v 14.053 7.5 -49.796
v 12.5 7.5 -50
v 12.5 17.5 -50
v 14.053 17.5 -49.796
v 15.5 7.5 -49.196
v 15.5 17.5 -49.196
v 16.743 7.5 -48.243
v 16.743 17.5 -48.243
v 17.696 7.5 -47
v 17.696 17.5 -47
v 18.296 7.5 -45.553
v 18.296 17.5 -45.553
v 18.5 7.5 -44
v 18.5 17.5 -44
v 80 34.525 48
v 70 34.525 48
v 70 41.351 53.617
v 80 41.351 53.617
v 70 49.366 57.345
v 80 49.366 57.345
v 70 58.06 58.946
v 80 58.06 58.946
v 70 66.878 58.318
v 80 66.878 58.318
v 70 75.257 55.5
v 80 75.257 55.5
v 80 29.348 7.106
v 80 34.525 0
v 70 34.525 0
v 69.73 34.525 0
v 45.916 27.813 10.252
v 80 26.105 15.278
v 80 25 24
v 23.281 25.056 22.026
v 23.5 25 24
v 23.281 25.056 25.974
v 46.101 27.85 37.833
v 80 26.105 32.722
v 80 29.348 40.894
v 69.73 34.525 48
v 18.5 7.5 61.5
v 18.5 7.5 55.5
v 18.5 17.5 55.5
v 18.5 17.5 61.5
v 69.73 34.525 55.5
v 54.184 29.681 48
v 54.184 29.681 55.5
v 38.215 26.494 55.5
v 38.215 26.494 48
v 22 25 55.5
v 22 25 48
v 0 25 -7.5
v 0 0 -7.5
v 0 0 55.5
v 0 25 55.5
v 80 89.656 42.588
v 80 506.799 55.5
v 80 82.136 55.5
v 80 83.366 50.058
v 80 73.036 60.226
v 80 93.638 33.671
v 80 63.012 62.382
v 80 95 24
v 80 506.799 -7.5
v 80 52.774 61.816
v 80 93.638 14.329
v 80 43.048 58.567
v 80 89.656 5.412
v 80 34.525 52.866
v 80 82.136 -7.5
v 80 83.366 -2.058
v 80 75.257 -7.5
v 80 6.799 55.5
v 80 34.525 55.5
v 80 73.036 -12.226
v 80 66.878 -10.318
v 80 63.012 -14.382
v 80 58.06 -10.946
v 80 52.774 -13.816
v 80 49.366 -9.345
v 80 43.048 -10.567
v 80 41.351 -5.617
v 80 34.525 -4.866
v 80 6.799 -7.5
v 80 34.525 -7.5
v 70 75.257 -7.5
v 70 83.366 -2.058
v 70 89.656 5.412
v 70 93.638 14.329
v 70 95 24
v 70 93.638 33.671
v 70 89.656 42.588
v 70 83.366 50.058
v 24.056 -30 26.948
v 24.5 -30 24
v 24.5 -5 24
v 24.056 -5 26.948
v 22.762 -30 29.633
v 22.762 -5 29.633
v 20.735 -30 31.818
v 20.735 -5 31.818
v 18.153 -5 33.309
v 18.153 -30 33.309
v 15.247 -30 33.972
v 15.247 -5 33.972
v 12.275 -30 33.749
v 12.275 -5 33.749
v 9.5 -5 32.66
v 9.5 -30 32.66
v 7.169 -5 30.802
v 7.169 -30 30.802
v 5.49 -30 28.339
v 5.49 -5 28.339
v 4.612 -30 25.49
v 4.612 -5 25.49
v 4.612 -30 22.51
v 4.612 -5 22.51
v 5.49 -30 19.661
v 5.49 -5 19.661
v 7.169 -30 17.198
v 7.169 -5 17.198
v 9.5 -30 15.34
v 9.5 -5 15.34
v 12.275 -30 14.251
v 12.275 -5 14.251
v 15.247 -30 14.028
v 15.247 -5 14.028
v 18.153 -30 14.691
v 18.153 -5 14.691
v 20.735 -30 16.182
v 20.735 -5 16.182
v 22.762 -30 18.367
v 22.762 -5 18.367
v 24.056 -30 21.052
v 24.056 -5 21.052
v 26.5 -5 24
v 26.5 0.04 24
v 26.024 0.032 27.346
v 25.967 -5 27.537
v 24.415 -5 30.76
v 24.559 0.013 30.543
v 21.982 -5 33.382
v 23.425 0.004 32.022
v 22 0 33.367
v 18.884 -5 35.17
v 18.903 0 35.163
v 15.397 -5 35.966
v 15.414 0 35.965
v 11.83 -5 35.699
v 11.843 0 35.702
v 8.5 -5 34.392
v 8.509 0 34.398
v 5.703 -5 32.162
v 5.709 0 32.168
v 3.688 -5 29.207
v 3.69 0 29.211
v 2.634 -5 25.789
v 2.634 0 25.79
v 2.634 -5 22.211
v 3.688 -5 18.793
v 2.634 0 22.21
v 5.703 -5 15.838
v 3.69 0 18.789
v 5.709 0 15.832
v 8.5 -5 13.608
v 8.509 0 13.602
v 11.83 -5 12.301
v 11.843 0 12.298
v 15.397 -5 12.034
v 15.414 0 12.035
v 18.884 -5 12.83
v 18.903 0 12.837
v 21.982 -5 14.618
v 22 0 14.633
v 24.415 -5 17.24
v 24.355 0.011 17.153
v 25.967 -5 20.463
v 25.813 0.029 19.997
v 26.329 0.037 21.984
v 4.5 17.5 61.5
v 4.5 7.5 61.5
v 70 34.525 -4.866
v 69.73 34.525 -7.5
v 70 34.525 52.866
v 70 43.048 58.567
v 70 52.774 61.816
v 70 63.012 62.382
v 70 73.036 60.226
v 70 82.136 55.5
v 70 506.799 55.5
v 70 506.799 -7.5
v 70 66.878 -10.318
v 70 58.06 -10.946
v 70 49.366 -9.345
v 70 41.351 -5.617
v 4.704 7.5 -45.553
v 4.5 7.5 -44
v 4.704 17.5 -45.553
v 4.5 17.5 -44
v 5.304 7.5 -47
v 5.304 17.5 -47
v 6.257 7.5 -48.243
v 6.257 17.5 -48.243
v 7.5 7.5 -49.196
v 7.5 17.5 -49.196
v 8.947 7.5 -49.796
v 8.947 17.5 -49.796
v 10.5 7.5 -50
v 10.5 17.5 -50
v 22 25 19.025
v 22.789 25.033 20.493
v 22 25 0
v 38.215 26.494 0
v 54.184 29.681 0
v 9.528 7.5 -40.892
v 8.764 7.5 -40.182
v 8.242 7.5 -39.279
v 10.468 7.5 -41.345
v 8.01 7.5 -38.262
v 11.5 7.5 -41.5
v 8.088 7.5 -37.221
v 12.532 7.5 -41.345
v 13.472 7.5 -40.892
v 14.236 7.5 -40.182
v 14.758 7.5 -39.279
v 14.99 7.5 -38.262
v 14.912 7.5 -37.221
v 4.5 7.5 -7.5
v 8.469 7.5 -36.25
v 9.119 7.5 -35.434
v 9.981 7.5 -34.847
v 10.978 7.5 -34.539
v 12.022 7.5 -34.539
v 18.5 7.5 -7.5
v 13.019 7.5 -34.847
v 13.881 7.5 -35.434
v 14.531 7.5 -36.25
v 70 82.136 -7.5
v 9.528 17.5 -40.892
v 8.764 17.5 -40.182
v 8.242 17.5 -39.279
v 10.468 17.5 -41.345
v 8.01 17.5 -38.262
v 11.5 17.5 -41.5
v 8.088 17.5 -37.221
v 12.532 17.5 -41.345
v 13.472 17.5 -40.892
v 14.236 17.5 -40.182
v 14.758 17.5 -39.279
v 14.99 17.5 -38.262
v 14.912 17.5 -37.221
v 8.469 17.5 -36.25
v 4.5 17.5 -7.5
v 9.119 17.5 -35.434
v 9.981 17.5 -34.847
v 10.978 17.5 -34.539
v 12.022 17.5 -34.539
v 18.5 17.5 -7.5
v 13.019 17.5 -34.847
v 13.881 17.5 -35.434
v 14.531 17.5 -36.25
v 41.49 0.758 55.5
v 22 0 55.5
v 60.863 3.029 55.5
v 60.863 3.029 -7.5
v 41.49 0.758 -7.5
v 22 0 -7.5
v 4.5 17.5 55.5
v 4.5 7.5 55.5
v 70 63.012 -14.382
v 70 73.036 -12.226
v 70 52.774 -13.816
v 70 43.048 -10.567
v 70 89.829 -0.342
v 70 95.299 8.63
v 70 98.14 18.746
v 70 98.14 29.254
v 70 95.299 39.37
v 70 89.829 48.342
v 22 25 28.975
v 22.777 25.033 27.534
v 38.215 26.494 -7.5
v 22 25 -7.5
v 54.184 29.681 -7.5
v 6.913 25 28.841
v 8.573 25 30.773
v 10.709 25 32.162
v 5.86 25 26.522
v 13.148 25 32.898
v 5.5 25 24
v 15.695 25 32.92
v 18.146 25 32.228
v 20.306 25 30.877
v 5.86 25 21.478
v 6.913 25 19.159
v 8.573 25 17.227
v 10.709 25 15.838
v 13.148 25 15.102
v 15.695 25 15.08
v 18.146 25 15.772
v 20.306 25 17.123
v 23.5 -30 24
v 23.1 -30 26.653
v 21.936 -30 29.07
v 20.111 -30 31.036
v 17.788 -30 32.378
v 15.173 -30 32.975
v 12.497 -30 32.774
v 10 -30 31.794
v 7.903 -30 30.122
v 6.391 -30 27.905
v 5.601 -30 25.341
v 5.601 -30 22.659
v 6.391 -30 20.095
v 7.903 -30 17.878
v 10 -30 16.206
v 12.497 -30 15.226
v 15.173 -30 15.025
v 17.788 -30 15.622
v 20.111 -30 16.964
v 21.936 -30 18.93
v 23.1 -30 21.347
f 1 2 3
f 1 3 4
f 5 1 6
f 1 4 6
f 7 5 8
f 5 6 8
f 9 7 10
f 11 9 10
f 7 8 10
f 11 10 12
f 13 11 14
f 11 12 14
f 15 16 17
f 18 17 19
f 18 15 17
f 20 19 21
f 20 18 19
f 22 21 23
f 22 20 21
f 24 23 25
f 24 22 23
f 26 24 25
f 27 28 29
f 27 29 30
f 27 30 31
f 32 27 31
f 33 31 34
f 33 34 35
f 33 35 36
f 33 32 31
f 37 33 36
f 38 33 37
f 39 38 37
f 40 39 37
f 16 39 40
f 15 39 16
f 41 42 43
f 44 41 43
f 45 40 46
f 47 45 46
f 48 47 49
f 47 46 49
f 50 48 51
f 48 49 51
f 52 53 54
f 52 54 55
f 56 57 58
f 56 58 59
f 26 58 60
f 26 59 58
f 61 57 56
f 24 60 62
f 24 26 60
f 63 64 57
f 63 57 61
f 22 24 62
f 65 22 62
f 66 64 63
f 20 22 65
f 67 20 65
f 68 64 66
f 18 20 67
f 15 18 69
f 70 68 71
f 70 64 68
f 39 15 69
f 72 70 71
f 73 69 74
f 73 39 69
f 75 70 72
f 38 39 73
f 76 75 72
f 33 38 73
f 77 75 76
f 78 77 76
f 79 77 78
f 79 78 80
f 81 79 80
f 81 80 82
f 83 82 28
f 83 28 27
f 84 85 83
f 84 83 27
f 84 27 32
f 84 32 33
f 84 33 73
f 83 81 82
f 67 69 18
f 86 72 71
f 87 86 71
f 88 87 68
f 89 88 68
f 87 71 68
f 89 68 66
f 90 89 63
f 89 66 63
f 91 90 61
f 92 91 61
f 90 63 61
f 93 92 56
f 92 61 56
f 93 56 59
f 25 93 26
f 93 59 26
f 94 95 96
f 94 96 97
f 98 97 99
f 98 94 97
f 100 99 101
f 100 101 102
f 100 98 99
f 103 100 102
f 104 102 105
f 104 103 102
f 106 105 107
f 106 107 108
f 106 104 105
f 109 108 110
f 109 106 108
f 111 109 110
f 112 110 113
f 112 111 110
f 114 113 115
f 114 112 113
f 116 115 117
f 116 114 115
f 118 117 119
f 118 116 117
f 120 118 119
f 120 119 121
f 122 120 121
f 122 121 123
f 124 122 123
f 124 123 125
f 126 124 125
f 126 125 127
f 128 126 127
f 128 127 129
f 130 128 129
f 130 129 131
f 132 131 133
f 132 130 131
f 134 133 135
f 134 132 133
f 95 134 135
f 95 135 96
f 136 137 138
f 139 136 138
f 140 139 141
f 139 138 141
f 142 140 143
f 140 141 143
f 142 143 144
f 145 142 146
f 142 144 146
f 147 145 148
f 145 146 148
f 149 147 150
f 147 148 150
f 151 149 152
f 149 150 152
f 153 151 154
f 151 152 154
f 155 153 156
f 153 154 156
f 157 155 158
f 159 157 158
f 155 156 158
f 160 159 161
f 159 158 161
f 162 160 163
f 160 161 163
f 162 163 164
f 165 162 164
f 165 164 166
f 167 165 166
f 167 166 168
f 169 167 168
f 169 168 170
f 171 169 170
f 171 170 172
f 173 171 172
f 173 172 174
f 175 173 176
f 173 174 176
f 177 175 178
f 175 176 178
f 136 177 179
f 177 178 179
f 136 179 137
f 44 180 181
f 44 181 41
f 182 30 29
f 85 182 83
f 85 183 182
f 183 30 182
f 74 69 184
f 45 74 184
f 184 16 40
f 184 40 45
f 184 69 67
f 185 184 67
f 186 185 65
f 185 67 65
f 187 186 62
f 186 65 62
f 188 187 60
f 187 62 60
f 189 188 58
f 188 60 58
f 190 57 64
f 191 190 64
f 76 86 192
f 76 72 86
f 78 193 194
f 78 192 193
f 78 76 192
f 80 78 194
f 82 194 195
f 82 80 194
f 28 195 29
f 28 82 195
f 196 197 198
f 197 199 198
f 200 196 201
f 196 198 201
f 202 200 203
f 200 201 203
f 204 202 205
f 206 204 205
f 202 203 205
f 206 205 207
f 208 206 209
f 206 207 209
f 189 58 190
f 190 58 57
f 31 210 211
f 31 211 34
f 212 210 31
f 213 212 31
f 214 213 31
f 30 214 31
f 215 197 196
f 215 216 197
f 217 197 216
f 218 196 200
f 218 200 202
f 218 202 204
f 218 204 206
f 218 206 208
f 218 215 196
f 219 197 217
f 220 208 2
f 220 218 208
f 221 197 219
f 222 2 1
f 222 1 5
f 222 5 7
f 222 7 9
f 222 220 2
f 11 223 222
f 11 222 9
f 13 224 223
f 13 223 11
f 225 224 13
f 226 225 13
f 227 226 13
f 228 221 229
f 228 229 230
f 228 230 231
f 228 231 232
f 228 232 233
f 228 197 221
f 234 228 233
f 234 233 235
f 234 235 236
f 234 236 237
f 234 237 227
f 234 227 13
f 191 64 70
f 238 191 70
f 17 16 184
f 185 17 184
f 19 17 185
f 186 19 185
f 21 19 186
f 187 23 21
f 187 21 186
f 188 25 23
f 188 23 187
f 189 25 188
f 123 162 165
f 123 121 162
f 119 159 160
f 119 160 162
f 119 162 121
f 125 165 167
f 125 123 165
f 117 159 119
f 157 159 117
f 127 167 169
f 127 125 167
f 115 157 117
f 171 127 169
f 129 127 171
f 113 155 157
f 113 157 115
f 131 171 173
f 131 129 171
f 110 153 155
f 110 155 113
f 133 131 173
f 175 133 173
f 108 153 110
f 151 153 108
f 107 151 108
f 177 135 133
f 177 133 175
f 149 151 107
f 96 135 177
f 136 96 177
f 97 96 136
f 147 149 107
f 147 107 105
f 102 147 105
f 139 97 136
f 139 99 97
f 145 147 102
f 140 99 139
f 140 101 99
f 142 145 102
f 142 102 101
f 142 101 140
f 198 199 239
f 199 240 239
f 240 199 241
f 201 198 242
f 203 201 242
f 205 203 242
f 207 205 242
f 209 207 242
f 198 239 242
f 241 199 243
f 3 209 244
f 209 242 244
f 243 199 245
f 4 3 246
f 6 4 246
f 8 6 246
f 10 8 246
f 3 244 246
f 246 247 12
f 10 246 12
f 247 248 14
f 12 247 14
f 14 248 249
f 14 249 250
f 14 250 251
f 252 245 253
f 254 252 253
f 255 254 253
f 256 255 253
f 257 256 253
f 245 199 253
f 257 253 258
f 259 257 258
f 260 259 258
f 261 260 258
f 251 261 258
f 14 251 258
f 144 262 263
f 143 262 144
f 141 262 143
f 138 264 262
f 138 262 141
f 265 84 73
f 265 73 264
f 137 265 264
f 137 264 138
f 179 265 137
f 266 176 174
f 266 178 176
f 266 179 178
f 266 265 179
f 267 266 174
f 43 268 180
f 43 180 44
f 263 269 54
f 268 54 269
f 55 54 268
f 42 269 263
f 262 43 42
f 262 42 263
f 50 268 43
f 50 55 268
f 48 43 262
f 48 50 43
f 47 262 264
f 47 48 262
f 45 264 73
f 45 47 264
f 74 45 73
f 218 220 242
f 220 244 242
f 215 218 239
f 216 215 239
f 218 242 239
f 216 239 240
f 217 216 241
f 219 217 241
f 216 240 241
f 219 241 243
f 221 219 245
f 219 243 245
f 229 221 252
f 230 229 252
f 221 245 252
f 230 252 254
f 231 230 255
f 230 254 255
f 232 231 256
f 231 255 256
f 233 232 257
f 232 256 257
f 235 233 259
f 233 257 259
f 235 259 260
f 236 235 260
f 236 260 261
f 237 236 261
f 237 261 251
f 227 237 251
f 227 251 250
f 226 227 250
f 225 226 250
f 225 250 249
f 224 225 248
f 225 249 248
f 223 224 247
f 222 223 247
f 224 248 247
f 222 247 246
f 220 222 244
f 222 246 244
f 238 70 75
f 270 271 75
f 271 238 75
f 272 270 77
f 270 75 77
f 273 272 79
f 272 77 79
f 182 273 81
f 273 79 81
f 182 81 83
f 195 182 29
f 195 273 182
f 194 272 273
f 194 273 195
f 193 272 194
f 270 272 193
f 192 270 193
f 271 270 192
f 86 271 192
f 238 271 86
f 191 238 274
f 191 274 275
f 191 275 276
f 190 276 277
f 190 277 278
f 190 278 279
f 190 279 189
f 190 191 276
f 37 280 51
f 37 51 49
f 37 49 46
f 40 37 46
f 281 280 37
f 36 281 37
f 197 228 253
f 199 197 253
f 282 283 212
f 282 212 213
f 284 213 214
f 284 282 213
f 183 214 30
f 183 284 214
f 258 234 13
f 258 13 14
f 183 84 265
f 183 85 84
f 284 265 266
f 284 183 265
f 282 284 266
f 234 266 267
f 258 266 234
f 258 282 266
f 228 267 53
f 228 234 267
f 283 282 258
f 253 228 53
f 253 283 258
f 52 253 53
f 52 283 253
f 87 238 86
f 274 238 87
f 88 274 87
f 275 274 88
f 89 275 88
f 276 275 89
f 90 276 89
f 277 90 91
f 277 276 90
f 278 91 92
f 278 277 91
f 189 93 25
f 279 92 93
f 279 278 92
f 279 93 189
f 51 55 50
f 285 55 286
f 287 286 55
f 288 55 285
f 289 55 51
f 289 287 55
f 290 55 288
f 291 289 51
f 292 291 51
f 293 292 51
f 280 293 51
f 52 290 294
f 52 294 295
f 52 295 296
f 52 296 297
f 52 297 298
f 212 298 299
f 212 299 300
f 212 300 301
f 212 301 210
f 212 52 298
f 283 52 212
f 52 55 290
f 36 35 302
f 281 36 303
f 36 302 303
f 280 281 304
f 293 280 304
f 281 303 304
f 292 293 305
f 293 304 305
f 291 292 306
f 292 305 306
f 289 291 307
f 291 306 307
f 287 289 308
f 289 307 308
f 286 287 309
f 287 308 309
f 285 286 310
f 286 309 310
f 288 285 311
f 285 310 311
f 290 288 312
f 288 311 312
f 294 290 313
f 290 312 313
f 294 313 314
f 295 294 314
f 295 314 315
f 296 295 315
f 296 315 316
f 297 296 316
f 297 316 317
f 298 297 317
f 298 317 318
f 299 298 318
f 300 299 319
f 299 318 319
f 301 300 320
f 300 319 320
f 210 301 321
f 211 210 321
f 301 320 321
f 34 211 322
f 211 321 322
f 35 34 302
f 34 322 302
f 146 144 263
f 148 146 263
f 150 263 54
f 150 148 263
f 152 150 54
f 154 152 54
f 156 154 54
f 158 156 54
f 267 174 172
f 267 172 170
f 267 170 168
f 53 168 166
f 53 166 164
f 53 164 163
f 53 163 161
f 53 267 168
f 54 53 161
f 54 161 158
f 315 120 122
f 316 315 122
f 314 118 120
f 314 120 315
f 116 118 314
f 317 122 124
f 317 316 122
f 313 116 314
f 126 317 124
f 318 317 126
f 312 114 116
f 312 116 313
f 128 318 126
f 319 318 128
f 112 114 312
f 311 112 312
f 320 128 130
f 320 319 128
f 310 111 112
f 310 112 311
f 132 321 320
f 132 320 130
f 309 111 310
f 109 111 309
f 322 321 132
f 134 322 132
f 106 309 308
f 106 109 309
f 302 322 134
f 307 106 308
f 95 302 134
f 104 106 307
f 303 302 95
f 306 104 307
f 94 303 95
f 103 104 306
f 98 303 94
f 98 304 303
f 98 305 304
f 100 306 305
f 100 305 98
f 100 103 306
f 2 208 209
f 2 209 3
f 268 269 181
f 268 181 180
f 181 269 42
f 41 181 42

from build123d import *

# Parameters (mm, degrees)
BOSS_EXTRUDE1_DEPTH      = 48
SKETCH2_W                = 14
SKETCH2_H                = 10
BOSS_EXTRUDE2_DEPTH      = 50
FILLET1_R                = 6
SKETCH7_R                = 38.5
SKETCH7_R_2              = 35
BOSS_EXTRUDE3_DEPTH      = 10
SKETCH8_R                = 35
CUT_EXTRUDE2_DEPTH       = 90
BOSS_EXTRUDE4_DEPTH      = 5
BOSS_EXTRUDE4_DEPTH_BACK = 10
SKETCH10_R               = 12
SKETCH10_R_2             = 9
BOSS_EXTRUDE5_START      = 25
SKETCH11_R               = 10
SKETCH11_R_2             = 9
BOSS_EXTRUDE5_DEPTH      = 25
SKETCH12_R               = 9
CUT_EXTRUDE3_DEPTH       = 42
BOSS_EXTRUDE6_DEPTH      = 7.5
BOSS_EXTRUDE7_START      = 7.5
BOSS_EXTRUDE7_DEPTH      = 7.5
FILLET1_OF_MIRROR1_R     = 6
SKETCH15_W               = 14
SKETCH15_H               = 10
CUT_EXTRUDE4_DEPTH       = 101
BOSS_EXTRUDE8_DEPTH      = 10


with BuildPart() as part:
    # Sketch1 → Boss-Extrude1 (new body)
    with BuildSketch(Plane.XY):
        with BuildLine():
            Line((0, 0), (0, 25.00039893))
            Line((0, 25.00039893), (22, 25.00039893))
            ThreePointArc((22, 25.00039893), (51.667114877, 29.062120939), (80, 38.751440389))
            Line((80, 38.751440389), (80, 6.798665084))
            ThreePointArc((80, 6.798665084), (51.198552391, 1.705464917), (22, 0))
            Line((22, 0), (0, 0))
        make_face()
    extrude(amount=BOSS_EXTRUDE1_DEPTH)

    # Sketch2 → Boss-Extrude2 (add)
    with BuildSketch(Plane.XY.offset(48)):
        with Locations((11.5, 12.5)):
            Rectangle(SKETCH2_W, SKETCH2_H)
    boss_extrude2 = extrude(amount=BOSS_EXTRUDE2_DEPTH)

    # Sketch5 → M8x1.0 Tapped Hole1 (revolve, cut)
    with BuildSketch(Plane(origin=(11.5, 17.5, 86), x_dir=(0, 0, 1), z_dir=(1, 0, 0))):
        Polygon((0, 0), (0, 12.103012167), (3.5, 10), (3.5, 0), align=None)
    m8x1_0_tapped_hole1 = revolve(axis=Axis((11.5, 23.85, 86), (0, -1, 0)), mode=Mode.SUBTRACT)

    # Fillet1
    fillet1_edges = [part.edges().sort_by_distance(p)[0] for p in [
        (18.5, 12.5, 98),
        (4.5, 12.5, 98),
    ]]
    fillet(fillet1_edges, radius=FILLET1_R)

    # Sketch7 → Boss-Extrude3 (add)
    with BuildSketch(Plane.ZY.offset(-80)):
        with Locations((24, 60.00039893)):
            Circle(SKETCH7_R)
        with Locations((24, 60.00039893)):
            Circle(SKETCH7_R_2, mode=Mode.SUBTRACT)
    extrude(amount=BOSS_EXTRUDE3_DEPTH)

    # Sketch8 → Cut-Extrude2 (cut)
    with BuildSketch(Plane.ZY.offset(-80)):
        with Locations(Location((24, 60.00039893, 0), (0, 0, 226.708192407))):
            Circle(SKETCH8_R)
    extrude(amount=CUT_EXTRUDE2_DEPTH, mode=Mode.SUBTRACT)

    # Sketch10 → Boss-Extrude4 (add, two sides: drawn at the far end of the back side and taken through both)
    with BuildSketch(Plane.XZ.offset(-BOSS_EXTRUDE4_DEPTH_BACK)):
        with Locations((14.5, 24)):
            Circle(SKETCH10_R)
        with Locations((14.5, 24)):
            Circle(SKETCH10_R_2, mode=Mode.SUBTRACT)
    extrude(amount=BOSS_EXTRUDE4_DEPTH + BOSS_EXTRUDE4_DEPTH_BACK)

    # Sketch11 → Boss-Extrude5 (add)
    with BuildSketch(Plane.XZ.offset(5).offset(BOSS_EXTRUDE5_START)):
        with Locations((14.5, 24)):
            Circle(SKETCH11_R)
        with Locations((14.5, 24)):
            Circle(SKETCH11_R_2, mode=Mode.SUBTRACT)
    extrude(amount=-BOSS_EXTRUDE5_DEPTH)

    # Sketch12 → Cut-Extrude3 (cut)
    with BuildSketch(Plane(origin=(0, 0, 0), x_dir=(-1, 0, 0), z_dir=(0, -1, 0))):
        with Locations(Location((-14.5, -24, 0), (0, 0, 180))):
            Circle(SKETCH12_R)
    extrude(amount=-CUT_EXTRUDE3_DEPTH, mode=Mode.SUBTRACT)

    # Sketch13 → Boss-Extrude6 (add)
    with BuildSketch(Plane.XY.offset(48)):
        with BuildLine():
            Line((0, 25.00039893), (0, 0))
            Line((0, 0), (22, 0))
            ThreePointArc((22, 0), (51.198552391, 1.705464917), (80, 6.798665084))
            Line((80, 6.798665084), (80, 29.896412483))
            Line((80, 29.896412483), (80, 34.524920524))
            Line((80, 34.524920524), (70, 34.524920524))
            Line((70, 34.524920524), (69.729925021, 34.524920524))
            ThreePointArc((69.729925021, 34.524920524), (46.24106465, 27.877911315), (22, 25.00039893))
            Line((22, 25.00039893), (0, 25.00039893))
        make_face()
    extrude(amount=BOSS_EXTRUDE6_DEPTH)

    # Sketch14 → Boss-Extrude7 (add)
    with BuildSketch(Plane(origin=(0, 0, 0), x_dir=(-1, 0, 0), z_dir=(0, 0, -1)).offset(BOSS_EXTRUDE7_START)):
        with BuildLine():
            Line((-80, 29.896412483), (-80, 6.798665084))
            ThreePointArc((-80, 6.798665084), (-51.198552391, 1.705464917), (-22, 0))
            Line((-22, 0), (0, 0))
            Line((0, 0), (0, 25.00039893))
            Line((0, 25.00039893), (-22, 25.00039893))
            ThreePointArc((-22, 25.00039893), (-46.24106465, 27.877911315), (-69.729925021, 34.524920524))
            Line((-69.729925021, 34.524920524), (-70, 34.524920524))
            Line((-70, 34.524920524), (-80, 34.524920524))
            Line((-80, 34.524920524), (-80, 29.896412483))
        make_face()
    extrude(amount=-BOSS_EXTRUDE7_DEPTH)

    # Mirror1: Boss-Extrude2, M8x1.0 Tapped Hole1 across plane
    add(boss_extrude2.mirror(Plane.XY.offset(24)))
    add(m8x1_0_tapped_hole1.mirror(Plane.XY.offset(24)), mode=Mode.SUBTRACT)

    # Fillet1 of Mirror1
    fillet1_of_mirror1_edges = [part.edges().sort_by_distance(p)[0] for p in [
        (18.5, 12.5, -50),
        (4.5, 12.5, -50),
    ]]
    fillet(fillet1_of_mirror1_edges, radius=FILLET1_OF_MIRROR1_R)

    # Sketch15 → Cut-Extrude4 (cut)
    with BuildSketch(Plane.XY.offset(61.5)):
        with Locations((11.5, 12.5)):
            Rectangle(SKETCH15_W, SKETCH15_H)
    extrude(amount=CUT_EXTRUDE4_DEPTH, mode=Mode.SUBTRACT)

    # Sketch16 → Boss-Extrude8 (add)
    with BuildSketch(Plane(origin=(80, 0, 0), x_dir=(0, 0, -1), z_dir=(1, 0, 0))):
        with BuildLine():
            Line((-55.5, 75.256545232), (-55.5, 506.798665084))
            Line((-55.5, 506.798665084), (7.5, 506.798665084))
            Line((7.5, 506.798665084), (7.5, 75.256545232))
            ThreePointArc((7.5, 75.256545232), (-24, 95.00039893), (-55.5, 75.256545232))
        make_face()
    extrude(amount=-BOSS_EXTRUDE8_DEPTH)


solid = part.part
